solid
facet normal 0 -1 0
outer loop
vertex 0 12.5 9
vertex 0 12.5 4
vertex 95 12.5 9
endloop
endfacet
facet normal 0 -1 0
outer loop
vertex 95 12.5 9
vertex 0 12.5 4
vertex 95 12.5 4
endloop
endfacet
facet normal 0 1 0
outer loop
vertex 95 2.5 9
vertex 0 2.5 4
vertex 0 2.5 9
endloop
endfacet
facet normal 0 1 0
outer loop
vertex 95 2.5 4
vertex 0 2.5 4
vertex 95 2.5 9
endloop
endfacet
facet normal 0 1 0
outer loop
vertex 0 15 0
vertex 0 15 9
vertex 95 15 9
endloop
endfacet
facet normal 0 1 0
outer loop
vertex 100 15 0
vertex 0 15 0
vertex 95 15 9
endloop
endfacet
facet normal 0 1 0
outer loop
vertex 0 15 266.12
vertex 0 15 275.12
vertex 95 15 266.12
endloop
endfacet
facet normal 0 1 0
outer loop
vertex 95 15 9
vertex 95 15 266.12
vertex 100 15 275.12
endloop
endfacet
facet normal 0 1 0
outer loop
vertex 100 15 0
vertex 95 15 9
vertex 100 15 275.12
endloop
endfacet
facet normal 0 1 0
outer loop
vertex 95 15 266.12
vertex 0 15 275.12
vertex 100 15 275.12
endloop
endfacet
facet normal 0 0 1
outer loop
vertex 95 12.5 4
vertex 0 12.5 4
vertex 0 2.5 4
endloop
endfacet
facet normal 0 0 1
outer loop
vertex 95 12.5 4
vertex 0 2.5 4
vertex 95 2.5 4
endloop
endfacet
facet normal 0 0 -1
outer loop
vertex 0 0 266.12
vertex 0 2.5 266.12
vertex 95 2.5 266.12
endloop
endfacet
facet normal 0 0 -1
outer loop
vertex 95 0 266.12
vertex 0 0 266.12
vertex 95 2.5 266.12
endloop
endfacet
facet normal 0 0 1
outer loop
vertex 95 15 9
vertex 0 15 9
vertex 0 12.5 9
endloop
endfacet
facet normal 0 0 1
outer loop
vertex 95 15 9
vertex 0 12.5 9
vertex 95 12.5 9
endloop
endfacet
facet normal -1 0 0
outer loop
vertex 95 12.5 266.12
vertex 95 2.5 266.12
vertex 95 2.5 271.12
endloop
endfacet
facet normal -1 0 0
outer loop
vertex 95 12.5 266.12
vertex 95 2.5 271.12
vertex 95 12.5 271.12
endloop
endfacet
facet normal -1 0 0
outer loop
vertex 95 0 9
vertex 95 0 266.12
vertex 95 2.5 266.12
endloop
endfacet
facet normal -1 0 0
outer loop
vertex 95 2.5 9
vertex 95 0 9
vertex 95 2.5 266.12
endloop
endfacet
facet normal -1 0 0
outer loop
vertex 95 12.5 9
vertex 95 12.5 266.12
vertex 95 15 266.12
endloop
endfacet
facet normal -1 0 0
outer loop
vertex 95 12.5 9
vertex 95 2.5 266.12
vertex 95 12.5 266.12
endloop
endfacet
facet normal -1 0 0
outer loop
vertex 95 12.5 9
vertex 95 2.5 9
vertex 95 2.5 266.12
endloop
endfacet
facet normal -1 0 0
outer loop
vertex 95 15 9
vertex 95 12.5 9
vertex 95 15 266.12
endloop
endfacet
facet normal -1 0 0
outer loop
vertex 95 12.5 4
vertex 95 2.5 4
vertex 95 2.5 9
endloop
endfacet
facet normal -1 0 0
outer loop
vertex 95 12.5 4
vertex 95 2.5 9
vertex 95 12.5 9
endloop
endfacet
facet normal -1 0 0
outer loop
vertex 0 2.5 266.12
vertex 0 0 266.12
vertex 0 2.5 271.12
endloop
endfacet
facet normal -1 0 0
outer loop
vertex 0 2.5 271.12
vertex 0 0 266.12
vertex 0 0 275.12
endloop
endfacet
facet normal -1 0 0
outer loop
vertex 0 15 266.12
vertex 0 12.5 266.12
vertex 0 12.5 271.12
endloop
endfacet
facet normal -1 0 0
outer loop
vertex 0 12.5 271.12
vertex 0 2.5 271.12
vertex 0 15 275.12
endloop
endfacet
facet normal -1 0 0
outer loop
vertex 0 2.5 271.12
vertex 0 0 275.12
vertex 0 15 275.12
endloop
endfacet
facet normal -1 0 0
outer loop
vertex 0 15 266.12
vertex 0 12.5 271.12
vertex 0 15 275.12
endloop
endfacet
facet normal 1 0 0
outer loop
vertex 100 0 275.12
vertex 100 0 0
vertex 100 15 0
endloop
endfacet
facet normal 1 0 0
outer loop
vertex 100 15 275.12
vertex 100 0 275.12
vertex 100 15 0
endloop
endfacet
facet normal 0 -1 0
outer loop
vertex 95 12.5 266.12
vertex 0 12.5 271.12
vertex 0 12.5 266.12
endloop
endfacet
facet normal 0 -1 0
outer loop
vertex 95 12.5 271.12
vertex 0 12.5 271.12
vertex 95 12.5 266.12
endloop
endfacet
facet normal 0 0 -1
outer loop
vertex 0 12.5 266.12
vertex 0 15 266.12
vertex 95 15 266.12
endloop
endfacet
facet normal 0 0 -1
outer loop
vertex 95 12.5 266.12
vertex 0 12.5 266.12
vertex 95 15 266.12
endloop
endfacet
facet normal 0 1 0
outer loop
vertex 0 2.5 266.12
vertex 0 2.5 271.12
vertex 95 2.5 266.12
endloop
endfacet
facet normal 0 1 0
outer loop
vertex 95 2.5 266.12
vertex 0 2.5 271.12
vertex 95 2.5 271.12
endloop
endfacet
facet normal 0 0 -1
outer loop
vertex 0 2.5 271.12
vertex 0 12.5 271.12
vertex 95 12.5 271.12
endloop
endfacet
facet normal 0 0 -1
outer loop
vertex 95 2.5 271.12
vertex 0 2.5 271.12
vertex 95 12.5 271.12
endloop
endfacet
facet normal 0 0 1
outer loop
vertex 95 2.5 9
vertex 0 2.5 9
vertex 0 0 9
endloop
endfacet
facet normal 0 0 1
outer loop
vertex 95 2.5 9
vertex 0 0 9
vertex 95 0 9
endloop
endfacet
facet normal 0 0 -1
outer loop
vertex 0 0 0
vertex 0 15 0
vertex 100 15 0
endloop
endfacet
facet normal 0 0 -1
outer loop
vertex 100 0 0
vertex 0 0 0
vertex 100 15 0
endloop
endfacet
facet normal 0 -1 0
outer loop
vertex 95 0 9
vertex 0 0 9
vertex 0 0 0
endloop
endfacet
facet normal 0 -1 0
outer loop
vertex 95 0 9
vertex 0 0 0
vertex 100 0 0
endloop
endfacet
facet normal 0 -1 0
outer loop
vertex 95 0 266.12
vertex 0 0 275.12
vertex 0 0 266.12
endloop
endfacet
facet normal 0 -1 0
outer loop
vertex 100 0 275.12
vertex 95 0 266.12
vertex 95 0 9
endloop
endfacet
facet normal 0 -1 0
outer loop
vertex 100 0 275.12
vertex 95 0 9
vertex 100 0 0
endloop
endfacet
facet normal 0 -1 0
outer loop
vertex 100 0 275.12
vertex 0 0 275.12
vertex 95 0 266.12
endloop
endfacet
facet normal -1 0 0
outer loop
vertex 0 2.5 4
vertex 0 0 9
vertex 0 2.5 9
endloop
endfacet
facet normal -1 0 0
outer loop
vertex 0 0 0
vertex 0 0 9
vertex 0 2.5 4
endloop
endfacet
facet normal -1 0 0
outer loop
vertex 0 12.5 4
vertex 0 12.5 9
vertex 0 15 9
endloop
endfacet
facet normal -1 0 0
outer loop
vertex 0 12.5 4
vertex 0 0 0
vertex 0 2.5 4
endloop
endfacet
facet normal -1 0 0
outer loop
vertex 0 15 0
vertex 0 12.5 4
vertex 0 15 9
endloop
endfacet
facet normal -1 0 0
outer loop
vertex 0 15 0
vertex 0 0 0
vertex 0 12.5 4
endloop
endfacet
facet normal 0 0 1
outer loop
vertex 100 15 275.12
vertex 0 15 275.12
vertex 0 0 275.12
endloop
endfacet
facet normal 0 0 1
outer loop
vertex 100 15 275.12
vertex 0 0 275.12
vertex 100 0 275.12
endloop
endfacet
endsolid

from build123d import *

# Parameters (mm, degrees)
ESQUISSE1_W        = 100
ESQUISSE1_H        = 15
BOSS_EXTRU_1_DEPTH = 4
ESQUISSE2_W        = 100
ESQUISSE2_H        = 2.5
BOSS_EXTRU_2_DEPTH = 5
ESQUISSE3_W        = 5
ESQUISSE3_H        = 15
BOSS_EXTRU_3_DEPTH = 267.12


with BuildPart() as part:
    # Esquisse1 → Boss.-Extru.1 (new body)
    with BuildSketch(Plane.XY):
        with Locations((50, 7.5)):
            Rectangle(ESQUISSE1_W, ESQUISSE1_H)
    boss_extru_1 = extrude(amount=BOSS_EXTRU_1_DEPTH)

    # Esquisse2 → Boss.-Extru.2 (add)
    with BuildSketch(Plane.XY.offset(4)):
        with Locations((50, 13.75)):
            Rectangle(ESQUISSE2_W, ESQUISSE2_H)
        with Locations((50, 1.25)):
            Rectangle(ESQUISSE2_W, ESQUISSE2_H)
    boss_extru_2 = extrude(amount=BOSS_EXTRU_2_DEPTH)

    # Esquisse3 → Boss.-Extru.3 (add)
    with BuildSketch(Plane.XY.offset(4)):
        with Locations((97.5, 7.5)):
            Rectangle(ESQUISSE3_W, ESQUISSE3_H)
    extrude(amount=BOSS_EXTRU_3_DEPTH)

    # Symétrie2: Boss.-Extru.1, Boss.-Extru.2 across plane
    add(boss_extru_1.mirror(Plane.XY.offset(137.56)))
    add(boss_extru_2.mirror(Plane.XY.offset(137.56)))


solid = part.part
